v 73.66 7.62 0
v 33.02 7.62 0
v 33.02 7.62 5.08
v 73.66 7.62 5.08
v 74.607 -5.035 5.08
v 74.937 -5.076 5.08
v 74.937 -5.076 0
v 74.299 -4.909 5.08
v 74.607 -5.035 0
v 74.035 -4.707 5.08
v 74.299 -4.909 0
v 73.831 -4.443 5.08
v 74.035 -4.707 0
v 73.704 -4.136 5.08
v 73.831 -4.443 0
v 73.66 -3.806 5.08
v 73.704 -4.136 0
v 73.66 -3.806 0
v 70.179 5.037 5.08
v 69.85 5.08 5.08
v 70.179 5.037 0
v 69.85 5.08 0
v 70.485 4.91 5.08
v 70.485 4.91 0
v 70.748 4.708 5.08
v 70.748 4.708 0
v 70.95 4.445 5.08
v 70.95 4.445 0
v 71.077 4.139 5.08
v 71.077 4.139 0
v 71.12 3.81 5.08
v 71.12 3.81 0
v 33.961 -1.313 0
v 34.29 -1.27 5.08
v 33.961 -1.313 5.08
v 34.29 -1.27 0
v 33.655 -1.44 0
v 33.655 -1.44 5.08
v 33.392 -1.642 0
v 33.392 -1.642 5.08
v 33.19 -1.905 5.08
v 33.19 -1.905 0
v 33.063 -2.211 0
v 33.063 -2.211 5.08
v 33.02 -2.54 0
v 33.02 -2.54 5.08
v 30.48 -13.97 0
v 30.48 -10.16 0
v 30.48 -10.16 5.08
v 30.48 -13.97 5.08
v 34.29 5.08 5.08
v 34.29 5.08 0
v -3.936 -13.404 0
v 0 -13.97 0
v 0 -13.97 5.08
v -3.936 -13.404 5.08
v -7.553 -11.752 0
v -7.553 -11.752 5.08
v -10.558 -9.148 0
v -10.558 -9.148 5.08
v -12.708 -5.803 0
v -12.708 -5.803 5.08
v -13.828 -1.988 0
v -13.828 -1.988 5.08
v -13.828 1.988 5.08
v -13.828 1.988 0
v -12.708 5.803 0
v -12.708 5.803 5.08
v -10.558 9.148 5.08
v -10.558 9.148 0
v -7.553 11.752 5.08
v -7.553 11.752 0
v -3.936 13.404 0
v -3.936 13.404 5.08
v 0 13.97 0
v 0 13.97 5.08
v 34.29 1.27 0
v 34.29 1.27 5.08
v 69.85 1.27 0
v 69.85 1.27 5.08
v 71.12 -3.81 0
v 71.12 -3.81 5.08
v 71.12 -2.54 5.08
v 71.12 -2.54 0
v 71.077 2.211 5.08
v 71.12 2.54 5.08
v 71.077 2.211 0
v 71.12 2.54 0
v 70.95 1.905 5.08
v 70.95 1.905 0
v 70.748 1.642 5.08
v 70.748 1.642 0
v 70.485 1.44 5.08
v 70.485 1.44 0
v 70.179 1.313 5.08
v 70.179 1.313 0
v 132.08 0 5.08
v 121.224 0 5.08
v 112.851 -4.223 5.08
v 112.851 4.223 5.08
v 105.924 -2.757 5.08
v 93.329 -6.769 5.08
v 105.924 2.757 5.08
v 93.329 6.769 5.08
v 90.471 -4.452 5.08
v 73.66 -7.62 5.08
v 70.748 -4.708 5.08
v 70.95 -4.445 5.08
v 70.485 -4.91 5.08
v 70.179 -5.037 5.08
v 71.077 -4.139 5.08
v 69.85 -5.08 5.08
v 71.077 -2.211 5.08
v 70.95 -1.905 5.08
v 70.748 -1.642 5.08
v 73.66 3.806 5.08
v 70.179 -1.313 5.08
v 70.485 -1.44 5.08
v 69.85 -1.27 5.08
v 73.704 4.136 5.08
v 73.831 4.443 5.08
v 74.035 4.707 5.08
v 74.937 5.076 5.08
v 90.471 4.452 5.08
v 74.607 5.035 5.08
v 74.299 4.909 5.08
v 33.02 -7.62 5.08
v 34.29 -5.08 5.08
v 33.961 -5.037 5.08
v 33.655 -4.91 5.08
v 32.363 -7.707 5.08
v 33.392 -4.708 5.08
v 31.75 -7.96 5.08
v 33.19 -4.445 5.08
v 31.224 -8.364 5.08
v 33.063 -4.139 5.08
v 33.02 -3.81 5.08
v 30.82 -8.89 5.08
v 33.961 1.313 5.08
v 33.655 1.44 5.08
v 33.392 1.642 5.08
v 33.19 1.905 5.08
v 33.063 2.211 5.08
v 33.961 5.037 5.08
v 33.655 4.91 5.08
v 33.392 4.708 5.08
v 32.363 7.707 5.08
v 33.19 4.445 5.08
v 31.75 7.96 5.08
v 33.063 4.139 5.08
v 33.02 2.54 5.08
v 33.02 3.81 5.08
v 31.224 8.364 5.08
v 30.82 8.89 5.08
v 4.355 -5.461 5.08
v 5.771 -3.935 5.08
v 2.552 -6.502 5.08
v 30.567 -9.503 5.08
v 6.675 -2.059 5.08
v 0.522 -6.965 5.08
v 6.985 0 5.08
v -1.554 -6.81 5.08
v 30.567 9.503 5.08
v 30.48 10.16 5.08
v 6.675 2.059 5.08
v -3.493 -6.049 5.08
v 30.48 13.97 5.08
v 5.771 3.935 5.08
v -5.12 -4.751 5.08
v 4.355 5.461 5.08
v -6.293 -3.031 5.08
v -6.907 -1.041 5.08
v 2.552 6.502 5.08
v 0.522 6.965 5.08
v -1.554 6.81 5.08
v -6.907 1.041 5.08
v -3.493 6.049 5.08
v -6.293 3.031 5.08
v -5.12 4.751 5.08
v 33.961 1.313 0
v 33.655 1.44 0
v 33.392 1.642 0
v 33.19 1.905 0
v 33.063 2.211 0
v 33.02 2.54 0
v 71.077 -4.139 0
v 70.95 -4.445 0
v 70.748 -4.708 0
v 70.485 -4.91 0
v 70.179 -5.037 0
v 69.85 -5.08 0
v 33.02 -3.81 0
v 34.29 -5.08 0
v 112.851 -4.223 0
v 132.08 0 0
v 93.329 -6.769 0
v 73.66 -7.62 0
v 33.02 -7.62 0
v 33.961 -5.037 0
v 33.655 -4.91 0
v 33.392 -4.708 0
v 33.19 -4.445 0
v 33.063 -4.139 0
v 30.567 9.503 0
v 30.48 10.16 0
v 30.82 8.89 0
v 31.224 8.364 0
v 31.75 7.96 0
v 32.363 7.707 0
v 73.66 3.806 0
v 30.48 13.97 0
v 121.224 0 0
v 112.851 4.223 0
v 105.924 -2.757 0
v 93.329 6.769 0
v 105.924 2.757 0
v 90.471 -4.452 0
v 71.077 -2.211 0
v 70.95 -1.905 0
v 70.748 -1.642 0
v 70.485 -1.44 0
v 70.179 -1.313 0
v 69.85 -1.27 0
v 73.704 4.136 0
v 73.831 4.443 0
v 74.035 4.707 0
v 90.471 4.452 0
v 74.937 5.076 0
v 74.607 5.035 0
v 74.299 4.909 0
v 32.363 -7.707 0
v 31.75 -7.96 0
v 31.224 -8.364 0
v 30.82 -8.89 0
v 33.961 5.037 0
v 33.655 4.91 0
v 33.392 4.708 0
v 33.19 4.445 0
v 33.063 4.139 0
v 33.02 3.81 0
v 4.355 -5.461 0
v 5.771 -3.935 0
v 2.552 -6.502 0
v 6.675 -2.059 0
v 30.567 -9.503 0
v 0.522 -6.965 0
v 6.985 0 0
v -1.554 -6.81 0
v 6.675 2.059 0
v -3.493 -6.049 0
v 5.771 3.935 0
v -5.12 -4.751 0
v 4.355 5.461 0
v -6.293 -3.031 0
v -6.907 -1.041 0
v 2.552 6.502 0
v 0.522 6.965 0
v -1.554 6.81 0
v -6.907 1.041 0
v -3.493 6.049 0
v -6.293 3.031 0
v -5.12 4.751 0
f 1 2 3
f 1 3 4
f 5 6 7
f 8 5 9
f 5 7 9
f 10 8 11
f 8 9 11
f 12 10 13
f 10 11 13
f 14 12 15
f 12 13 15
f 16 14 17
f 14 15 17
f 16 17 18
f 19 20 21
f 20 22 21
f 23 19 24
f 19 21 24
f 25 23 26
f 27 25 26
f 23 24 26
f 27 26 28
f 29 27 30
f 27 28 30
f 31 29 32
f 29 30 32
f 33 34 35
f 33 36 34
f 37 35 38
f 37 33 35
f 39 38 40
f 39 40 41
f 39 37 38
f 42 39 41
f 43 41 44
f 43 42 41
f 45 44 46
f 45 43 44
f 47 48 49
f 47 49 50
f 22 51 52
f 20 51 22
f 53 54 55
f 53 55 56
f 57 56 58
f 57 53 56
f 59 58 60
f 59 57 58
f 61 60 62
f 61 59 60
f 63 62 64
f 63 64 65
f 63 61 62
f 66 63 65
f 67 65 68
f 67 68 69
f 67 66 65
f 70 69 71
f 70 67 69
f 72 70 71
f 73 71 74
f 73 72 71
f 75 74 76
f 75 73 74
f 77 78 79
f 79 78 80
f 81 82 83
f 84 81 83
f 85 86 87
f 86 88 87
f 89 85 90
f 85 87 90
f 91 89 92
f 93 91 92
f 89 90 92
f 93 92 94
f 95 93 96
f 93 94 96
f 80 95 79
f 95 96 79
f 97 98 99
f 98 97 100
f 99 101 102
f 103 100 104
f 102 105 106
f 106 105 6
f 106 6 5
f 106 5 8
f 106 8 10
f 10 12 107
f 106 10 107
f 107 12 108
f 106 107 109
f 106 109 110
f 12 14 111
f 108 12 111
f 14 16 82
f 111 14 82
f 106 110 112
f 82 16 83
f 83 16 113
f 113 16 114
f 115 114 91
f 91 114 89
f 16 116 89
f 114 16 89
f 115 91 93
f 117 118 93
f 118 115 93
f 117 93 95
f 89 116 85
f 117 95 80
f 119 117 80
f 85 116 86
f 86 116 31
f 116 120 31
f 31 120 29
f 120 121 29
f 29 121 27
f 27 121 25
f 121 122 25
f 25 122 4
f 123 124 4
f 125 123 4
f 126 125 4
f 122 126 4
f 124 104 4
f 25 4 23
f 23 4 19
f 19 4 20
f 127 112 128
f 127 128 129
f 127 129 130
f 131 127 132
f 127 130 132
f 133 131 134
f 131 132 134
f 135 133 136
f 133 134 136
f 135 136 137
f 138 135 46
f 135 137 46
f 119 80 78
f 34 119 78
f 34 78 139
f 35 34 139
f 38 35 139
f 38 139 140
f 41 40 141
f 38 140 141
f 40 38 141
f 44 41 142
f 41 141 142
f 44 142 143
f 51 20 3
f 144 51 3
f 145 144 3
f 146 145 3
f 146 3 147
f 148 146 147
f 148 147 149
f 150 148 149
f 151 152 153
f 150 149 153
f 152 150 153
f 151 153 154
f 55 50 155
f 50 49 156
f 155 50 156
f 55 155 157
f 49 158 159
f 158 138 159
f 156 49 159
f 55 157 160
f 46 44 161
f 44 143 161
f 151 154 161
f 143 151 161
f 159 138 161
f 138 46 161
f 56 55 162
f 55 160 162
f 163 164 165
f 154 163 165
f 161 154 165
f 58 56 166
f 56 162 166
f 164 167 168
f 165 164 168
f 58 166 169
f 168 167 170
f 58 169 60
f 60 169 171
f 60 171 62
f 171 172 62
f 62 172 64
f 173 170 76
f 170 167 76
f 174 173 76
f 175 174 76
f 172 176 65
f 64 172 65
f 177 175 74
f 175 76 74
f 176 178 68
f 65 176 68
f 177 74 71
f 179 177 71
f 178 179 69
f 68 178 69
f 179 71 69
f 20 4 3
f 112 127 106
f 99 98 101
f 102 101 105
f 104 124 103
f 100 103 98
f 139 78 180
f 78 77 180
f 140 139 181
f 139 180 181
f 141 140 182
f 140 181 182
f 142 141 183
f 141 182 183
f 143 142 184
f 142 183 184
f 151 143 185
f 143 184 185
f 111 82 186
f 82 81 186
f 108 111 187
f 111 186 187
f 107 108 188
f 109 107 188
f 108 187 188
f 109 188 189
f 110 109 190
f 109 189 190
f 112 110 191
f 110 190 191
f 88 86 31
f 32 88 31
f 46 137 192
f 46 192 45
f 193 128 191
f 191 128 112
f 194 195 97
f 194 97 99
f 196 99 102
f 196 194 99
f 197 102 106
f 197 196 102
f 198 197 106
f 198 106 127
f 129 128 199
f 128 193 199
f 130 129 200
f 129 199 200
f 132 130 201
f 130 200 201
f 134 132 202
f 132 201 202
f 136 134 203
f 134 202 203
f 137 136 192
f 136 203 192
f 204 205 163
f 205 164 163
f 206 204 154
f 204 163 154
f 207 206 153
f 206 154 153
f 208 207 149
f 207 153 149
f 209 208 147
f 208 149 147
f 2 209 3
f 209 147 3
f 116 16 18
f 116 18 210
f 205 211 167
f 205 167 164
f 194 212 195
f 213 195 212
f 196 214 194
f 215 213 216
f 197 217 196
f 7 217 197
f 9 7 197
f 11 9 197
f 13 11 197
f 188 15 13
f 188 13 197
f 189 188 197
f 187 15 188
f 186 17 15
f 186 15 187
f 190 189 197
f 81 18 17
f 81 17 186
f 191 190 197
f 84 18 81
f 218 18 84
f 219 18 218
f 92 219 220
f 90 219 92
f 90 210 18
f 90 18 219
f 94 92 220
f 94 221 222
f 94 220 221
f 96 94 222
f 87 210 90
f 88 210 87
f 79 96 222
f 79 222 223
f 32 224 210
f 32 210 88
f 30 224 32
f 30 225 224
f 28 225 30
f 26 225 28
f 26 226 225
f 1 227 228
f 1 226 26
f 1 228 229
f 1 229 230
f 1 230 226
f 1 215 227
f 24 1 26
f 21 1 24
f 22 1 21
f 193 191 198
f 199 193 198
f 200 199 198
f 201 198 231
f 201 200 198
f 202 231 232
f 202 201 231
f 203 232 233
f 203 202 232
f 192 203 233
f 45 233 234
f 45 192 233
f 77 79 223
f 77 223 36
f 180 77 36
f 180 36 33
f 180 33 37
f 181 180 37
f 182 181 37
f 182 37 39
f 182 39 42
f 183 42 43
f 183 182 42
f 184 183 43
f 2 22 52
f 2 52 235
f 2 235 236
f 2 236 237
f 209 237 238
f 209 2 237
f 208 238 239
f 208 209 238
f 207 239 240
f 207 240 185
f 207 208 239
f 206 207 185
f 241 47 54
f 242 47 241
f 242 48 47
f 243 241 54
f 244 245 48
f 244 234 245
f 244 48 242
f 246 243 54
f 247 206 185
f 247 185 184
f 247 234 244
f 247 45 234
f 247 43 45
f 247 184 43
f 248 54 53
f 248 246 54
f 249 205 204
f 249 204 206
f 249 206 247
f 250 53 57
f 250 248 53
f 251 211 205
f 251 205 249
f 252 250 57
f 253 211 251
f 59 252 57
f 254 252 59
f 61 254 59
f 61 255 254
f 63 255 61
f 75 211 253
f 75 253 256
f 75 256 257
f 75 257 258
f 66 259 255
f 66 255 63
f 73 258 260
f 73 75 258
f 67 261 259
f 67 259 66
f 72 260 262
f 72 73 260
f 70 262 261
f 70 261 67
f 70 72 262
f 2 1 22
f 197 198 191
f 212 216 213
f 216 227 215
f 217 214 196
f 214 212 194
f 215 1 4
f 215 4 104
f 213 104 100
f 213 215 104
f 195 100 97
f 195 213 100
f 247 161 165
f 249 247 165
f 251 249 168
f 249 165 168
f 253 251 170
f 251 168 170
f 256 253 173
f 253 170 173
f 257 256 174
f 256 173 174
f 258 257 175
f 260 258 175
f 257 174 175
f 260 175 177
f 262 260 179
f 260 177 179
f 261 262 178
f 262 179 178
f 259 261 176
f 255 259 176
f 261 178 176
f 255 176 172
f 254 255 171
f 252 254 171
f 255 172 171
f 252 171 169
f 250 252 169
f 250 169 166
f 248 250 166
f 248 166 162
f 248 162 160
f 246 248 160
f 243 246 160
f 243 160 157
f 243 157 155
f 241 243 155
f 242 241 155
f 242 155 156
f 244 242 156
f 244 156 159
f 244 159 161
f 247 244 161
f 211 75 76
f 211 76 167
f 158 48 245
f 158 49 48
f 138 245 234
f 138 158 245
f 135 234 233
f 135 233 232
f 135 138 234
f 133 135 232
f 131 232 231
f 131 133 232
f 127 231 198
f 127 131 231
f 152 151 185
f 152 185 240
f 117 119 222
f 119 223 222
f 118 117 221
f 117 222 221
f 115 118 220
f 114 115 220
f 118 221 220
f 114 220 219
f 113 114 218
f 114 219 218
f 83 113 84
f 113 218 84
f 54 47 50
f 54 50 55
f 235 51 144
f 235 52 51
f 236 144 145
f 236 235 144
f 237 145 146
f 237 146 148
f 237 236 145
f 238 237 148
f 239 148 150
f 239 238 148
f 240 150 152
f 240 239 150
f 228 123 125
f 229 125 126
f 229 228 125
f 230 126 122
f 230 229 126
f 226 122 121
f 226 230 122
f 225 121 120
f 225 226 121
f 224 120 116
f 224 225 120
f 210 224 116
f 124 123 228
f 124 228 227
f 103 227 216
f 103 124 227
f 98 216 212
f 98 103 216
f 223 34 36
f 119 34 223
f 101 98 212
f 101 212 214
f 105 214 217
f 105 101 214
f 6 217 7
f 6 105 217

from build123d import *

# Parameters (mm, degrees)
BOSS_EXTRUDE1_DEPTH = 5.08
SKETCH2_R           = 6.985
CUT_EXTRUDE1_DEPTH  = 133.913858194
FILLET1_R           = 2.54
SKETCH3_W           = 38.1
SKETCH3_H           = 3.81
CUT_EXTRUDE2_DEPTH  = 133.913858194
FILLET2_R           = 1.27


with BuildPart() as part:
    # Sketch1 → Boss-Extrude1 (new body)
    with BuildSketch(Plane.XY):
        with BuildLine():
            Line((0, 13.97), (30.48, 13.97))
            Line((30.48, 13.97), (30.48, 7.62))
            Line((30.48, 7.62), (73.66, 7.62))
            ThreePointArc((73.66, 7.62), (103.117430302, 5.706965649), (132.08, 0))
            ThreePointArc((132.08, 0), (103.117430302, -5.706965649), (73.66, -7.62))
            Line((73.66, -7.62), (30.48, -7.62))
            Line((30.48, -7.62), (30.48, -13.97))
            Line((30.48, -13.97), (0, -13.97))
            ThreePointArc((0, -13.97), (-13.97, 0), (0, 13.97))
        make_face()
    extrude(amount=BOSS_EXTRUDE1_DEPTH)

    # Sketch2 → Cut-Extrude1 (cut, through all)
    with BuildSketch(Plane.XY.offset(5.08)):
        Circle(SKETCH2_R)
    extrude(amount=-CUT_EXTRUDE1_DEPTH, mode=Mode.SUBTRACT)

    # Fillet1
    fillet1_edges = [part.edges().sort_by_distance(p)[0] for p in [
        (30.48, -7.62, 2.54),
        (30.48, 7.62, 2.54),
    ]]
    fillet(fillet1_edges, radius=FILLET1_R)

    # Sketch3 → Cut-Extrude2 (cut, through all)
    with BuildSketch(Plane.XY.offset(5.08)):
        with Locations((52.07, -3.175)):
            Rectangle(SKETCH3_W, SKETCH3_H)
        with Locations((52.07, 3.175)):
            Rectangle(SKETCH3_W, SKETCH3_H)
        with BuildLine():
            Line((73.66, -5.08), (73.66, 5.08))
            ThreePointArc((73.66, 5.08), (97.577396737, 3.806398837), (121.224283519, 0))
            ThreePointArc((121.224283519, 0), (97.577396737, -3.806398837), (73.66, -5.08))
        make_face()
    extrude(amount=-CUT_EXTRUDE2_DEPTH, mode=Mode.SUBTRACT)

    # Fillet2
    fillet2_edges = [part.edges().sort_by_distance(p)[0] for p in [
        (73.66, -5.08, 2.54),
        (73.66, 5.08, 2.54),
        (71.12, 1.27, 2.54),
        (33.02, 1.27, 2.54),
        (33.02, 5.08, 2.54),
        (71.12, 5.08, 2.54),
        (71.12, -1.27, 2.54),
        (71.12, -5.08, 2.54),
        (33.02, -5.08, 2.54),
        (33.02, -1.27, 2.54),
    ]]
    fillet(fillet2_edges, radius=FILLET2_R)


solid = part.part
